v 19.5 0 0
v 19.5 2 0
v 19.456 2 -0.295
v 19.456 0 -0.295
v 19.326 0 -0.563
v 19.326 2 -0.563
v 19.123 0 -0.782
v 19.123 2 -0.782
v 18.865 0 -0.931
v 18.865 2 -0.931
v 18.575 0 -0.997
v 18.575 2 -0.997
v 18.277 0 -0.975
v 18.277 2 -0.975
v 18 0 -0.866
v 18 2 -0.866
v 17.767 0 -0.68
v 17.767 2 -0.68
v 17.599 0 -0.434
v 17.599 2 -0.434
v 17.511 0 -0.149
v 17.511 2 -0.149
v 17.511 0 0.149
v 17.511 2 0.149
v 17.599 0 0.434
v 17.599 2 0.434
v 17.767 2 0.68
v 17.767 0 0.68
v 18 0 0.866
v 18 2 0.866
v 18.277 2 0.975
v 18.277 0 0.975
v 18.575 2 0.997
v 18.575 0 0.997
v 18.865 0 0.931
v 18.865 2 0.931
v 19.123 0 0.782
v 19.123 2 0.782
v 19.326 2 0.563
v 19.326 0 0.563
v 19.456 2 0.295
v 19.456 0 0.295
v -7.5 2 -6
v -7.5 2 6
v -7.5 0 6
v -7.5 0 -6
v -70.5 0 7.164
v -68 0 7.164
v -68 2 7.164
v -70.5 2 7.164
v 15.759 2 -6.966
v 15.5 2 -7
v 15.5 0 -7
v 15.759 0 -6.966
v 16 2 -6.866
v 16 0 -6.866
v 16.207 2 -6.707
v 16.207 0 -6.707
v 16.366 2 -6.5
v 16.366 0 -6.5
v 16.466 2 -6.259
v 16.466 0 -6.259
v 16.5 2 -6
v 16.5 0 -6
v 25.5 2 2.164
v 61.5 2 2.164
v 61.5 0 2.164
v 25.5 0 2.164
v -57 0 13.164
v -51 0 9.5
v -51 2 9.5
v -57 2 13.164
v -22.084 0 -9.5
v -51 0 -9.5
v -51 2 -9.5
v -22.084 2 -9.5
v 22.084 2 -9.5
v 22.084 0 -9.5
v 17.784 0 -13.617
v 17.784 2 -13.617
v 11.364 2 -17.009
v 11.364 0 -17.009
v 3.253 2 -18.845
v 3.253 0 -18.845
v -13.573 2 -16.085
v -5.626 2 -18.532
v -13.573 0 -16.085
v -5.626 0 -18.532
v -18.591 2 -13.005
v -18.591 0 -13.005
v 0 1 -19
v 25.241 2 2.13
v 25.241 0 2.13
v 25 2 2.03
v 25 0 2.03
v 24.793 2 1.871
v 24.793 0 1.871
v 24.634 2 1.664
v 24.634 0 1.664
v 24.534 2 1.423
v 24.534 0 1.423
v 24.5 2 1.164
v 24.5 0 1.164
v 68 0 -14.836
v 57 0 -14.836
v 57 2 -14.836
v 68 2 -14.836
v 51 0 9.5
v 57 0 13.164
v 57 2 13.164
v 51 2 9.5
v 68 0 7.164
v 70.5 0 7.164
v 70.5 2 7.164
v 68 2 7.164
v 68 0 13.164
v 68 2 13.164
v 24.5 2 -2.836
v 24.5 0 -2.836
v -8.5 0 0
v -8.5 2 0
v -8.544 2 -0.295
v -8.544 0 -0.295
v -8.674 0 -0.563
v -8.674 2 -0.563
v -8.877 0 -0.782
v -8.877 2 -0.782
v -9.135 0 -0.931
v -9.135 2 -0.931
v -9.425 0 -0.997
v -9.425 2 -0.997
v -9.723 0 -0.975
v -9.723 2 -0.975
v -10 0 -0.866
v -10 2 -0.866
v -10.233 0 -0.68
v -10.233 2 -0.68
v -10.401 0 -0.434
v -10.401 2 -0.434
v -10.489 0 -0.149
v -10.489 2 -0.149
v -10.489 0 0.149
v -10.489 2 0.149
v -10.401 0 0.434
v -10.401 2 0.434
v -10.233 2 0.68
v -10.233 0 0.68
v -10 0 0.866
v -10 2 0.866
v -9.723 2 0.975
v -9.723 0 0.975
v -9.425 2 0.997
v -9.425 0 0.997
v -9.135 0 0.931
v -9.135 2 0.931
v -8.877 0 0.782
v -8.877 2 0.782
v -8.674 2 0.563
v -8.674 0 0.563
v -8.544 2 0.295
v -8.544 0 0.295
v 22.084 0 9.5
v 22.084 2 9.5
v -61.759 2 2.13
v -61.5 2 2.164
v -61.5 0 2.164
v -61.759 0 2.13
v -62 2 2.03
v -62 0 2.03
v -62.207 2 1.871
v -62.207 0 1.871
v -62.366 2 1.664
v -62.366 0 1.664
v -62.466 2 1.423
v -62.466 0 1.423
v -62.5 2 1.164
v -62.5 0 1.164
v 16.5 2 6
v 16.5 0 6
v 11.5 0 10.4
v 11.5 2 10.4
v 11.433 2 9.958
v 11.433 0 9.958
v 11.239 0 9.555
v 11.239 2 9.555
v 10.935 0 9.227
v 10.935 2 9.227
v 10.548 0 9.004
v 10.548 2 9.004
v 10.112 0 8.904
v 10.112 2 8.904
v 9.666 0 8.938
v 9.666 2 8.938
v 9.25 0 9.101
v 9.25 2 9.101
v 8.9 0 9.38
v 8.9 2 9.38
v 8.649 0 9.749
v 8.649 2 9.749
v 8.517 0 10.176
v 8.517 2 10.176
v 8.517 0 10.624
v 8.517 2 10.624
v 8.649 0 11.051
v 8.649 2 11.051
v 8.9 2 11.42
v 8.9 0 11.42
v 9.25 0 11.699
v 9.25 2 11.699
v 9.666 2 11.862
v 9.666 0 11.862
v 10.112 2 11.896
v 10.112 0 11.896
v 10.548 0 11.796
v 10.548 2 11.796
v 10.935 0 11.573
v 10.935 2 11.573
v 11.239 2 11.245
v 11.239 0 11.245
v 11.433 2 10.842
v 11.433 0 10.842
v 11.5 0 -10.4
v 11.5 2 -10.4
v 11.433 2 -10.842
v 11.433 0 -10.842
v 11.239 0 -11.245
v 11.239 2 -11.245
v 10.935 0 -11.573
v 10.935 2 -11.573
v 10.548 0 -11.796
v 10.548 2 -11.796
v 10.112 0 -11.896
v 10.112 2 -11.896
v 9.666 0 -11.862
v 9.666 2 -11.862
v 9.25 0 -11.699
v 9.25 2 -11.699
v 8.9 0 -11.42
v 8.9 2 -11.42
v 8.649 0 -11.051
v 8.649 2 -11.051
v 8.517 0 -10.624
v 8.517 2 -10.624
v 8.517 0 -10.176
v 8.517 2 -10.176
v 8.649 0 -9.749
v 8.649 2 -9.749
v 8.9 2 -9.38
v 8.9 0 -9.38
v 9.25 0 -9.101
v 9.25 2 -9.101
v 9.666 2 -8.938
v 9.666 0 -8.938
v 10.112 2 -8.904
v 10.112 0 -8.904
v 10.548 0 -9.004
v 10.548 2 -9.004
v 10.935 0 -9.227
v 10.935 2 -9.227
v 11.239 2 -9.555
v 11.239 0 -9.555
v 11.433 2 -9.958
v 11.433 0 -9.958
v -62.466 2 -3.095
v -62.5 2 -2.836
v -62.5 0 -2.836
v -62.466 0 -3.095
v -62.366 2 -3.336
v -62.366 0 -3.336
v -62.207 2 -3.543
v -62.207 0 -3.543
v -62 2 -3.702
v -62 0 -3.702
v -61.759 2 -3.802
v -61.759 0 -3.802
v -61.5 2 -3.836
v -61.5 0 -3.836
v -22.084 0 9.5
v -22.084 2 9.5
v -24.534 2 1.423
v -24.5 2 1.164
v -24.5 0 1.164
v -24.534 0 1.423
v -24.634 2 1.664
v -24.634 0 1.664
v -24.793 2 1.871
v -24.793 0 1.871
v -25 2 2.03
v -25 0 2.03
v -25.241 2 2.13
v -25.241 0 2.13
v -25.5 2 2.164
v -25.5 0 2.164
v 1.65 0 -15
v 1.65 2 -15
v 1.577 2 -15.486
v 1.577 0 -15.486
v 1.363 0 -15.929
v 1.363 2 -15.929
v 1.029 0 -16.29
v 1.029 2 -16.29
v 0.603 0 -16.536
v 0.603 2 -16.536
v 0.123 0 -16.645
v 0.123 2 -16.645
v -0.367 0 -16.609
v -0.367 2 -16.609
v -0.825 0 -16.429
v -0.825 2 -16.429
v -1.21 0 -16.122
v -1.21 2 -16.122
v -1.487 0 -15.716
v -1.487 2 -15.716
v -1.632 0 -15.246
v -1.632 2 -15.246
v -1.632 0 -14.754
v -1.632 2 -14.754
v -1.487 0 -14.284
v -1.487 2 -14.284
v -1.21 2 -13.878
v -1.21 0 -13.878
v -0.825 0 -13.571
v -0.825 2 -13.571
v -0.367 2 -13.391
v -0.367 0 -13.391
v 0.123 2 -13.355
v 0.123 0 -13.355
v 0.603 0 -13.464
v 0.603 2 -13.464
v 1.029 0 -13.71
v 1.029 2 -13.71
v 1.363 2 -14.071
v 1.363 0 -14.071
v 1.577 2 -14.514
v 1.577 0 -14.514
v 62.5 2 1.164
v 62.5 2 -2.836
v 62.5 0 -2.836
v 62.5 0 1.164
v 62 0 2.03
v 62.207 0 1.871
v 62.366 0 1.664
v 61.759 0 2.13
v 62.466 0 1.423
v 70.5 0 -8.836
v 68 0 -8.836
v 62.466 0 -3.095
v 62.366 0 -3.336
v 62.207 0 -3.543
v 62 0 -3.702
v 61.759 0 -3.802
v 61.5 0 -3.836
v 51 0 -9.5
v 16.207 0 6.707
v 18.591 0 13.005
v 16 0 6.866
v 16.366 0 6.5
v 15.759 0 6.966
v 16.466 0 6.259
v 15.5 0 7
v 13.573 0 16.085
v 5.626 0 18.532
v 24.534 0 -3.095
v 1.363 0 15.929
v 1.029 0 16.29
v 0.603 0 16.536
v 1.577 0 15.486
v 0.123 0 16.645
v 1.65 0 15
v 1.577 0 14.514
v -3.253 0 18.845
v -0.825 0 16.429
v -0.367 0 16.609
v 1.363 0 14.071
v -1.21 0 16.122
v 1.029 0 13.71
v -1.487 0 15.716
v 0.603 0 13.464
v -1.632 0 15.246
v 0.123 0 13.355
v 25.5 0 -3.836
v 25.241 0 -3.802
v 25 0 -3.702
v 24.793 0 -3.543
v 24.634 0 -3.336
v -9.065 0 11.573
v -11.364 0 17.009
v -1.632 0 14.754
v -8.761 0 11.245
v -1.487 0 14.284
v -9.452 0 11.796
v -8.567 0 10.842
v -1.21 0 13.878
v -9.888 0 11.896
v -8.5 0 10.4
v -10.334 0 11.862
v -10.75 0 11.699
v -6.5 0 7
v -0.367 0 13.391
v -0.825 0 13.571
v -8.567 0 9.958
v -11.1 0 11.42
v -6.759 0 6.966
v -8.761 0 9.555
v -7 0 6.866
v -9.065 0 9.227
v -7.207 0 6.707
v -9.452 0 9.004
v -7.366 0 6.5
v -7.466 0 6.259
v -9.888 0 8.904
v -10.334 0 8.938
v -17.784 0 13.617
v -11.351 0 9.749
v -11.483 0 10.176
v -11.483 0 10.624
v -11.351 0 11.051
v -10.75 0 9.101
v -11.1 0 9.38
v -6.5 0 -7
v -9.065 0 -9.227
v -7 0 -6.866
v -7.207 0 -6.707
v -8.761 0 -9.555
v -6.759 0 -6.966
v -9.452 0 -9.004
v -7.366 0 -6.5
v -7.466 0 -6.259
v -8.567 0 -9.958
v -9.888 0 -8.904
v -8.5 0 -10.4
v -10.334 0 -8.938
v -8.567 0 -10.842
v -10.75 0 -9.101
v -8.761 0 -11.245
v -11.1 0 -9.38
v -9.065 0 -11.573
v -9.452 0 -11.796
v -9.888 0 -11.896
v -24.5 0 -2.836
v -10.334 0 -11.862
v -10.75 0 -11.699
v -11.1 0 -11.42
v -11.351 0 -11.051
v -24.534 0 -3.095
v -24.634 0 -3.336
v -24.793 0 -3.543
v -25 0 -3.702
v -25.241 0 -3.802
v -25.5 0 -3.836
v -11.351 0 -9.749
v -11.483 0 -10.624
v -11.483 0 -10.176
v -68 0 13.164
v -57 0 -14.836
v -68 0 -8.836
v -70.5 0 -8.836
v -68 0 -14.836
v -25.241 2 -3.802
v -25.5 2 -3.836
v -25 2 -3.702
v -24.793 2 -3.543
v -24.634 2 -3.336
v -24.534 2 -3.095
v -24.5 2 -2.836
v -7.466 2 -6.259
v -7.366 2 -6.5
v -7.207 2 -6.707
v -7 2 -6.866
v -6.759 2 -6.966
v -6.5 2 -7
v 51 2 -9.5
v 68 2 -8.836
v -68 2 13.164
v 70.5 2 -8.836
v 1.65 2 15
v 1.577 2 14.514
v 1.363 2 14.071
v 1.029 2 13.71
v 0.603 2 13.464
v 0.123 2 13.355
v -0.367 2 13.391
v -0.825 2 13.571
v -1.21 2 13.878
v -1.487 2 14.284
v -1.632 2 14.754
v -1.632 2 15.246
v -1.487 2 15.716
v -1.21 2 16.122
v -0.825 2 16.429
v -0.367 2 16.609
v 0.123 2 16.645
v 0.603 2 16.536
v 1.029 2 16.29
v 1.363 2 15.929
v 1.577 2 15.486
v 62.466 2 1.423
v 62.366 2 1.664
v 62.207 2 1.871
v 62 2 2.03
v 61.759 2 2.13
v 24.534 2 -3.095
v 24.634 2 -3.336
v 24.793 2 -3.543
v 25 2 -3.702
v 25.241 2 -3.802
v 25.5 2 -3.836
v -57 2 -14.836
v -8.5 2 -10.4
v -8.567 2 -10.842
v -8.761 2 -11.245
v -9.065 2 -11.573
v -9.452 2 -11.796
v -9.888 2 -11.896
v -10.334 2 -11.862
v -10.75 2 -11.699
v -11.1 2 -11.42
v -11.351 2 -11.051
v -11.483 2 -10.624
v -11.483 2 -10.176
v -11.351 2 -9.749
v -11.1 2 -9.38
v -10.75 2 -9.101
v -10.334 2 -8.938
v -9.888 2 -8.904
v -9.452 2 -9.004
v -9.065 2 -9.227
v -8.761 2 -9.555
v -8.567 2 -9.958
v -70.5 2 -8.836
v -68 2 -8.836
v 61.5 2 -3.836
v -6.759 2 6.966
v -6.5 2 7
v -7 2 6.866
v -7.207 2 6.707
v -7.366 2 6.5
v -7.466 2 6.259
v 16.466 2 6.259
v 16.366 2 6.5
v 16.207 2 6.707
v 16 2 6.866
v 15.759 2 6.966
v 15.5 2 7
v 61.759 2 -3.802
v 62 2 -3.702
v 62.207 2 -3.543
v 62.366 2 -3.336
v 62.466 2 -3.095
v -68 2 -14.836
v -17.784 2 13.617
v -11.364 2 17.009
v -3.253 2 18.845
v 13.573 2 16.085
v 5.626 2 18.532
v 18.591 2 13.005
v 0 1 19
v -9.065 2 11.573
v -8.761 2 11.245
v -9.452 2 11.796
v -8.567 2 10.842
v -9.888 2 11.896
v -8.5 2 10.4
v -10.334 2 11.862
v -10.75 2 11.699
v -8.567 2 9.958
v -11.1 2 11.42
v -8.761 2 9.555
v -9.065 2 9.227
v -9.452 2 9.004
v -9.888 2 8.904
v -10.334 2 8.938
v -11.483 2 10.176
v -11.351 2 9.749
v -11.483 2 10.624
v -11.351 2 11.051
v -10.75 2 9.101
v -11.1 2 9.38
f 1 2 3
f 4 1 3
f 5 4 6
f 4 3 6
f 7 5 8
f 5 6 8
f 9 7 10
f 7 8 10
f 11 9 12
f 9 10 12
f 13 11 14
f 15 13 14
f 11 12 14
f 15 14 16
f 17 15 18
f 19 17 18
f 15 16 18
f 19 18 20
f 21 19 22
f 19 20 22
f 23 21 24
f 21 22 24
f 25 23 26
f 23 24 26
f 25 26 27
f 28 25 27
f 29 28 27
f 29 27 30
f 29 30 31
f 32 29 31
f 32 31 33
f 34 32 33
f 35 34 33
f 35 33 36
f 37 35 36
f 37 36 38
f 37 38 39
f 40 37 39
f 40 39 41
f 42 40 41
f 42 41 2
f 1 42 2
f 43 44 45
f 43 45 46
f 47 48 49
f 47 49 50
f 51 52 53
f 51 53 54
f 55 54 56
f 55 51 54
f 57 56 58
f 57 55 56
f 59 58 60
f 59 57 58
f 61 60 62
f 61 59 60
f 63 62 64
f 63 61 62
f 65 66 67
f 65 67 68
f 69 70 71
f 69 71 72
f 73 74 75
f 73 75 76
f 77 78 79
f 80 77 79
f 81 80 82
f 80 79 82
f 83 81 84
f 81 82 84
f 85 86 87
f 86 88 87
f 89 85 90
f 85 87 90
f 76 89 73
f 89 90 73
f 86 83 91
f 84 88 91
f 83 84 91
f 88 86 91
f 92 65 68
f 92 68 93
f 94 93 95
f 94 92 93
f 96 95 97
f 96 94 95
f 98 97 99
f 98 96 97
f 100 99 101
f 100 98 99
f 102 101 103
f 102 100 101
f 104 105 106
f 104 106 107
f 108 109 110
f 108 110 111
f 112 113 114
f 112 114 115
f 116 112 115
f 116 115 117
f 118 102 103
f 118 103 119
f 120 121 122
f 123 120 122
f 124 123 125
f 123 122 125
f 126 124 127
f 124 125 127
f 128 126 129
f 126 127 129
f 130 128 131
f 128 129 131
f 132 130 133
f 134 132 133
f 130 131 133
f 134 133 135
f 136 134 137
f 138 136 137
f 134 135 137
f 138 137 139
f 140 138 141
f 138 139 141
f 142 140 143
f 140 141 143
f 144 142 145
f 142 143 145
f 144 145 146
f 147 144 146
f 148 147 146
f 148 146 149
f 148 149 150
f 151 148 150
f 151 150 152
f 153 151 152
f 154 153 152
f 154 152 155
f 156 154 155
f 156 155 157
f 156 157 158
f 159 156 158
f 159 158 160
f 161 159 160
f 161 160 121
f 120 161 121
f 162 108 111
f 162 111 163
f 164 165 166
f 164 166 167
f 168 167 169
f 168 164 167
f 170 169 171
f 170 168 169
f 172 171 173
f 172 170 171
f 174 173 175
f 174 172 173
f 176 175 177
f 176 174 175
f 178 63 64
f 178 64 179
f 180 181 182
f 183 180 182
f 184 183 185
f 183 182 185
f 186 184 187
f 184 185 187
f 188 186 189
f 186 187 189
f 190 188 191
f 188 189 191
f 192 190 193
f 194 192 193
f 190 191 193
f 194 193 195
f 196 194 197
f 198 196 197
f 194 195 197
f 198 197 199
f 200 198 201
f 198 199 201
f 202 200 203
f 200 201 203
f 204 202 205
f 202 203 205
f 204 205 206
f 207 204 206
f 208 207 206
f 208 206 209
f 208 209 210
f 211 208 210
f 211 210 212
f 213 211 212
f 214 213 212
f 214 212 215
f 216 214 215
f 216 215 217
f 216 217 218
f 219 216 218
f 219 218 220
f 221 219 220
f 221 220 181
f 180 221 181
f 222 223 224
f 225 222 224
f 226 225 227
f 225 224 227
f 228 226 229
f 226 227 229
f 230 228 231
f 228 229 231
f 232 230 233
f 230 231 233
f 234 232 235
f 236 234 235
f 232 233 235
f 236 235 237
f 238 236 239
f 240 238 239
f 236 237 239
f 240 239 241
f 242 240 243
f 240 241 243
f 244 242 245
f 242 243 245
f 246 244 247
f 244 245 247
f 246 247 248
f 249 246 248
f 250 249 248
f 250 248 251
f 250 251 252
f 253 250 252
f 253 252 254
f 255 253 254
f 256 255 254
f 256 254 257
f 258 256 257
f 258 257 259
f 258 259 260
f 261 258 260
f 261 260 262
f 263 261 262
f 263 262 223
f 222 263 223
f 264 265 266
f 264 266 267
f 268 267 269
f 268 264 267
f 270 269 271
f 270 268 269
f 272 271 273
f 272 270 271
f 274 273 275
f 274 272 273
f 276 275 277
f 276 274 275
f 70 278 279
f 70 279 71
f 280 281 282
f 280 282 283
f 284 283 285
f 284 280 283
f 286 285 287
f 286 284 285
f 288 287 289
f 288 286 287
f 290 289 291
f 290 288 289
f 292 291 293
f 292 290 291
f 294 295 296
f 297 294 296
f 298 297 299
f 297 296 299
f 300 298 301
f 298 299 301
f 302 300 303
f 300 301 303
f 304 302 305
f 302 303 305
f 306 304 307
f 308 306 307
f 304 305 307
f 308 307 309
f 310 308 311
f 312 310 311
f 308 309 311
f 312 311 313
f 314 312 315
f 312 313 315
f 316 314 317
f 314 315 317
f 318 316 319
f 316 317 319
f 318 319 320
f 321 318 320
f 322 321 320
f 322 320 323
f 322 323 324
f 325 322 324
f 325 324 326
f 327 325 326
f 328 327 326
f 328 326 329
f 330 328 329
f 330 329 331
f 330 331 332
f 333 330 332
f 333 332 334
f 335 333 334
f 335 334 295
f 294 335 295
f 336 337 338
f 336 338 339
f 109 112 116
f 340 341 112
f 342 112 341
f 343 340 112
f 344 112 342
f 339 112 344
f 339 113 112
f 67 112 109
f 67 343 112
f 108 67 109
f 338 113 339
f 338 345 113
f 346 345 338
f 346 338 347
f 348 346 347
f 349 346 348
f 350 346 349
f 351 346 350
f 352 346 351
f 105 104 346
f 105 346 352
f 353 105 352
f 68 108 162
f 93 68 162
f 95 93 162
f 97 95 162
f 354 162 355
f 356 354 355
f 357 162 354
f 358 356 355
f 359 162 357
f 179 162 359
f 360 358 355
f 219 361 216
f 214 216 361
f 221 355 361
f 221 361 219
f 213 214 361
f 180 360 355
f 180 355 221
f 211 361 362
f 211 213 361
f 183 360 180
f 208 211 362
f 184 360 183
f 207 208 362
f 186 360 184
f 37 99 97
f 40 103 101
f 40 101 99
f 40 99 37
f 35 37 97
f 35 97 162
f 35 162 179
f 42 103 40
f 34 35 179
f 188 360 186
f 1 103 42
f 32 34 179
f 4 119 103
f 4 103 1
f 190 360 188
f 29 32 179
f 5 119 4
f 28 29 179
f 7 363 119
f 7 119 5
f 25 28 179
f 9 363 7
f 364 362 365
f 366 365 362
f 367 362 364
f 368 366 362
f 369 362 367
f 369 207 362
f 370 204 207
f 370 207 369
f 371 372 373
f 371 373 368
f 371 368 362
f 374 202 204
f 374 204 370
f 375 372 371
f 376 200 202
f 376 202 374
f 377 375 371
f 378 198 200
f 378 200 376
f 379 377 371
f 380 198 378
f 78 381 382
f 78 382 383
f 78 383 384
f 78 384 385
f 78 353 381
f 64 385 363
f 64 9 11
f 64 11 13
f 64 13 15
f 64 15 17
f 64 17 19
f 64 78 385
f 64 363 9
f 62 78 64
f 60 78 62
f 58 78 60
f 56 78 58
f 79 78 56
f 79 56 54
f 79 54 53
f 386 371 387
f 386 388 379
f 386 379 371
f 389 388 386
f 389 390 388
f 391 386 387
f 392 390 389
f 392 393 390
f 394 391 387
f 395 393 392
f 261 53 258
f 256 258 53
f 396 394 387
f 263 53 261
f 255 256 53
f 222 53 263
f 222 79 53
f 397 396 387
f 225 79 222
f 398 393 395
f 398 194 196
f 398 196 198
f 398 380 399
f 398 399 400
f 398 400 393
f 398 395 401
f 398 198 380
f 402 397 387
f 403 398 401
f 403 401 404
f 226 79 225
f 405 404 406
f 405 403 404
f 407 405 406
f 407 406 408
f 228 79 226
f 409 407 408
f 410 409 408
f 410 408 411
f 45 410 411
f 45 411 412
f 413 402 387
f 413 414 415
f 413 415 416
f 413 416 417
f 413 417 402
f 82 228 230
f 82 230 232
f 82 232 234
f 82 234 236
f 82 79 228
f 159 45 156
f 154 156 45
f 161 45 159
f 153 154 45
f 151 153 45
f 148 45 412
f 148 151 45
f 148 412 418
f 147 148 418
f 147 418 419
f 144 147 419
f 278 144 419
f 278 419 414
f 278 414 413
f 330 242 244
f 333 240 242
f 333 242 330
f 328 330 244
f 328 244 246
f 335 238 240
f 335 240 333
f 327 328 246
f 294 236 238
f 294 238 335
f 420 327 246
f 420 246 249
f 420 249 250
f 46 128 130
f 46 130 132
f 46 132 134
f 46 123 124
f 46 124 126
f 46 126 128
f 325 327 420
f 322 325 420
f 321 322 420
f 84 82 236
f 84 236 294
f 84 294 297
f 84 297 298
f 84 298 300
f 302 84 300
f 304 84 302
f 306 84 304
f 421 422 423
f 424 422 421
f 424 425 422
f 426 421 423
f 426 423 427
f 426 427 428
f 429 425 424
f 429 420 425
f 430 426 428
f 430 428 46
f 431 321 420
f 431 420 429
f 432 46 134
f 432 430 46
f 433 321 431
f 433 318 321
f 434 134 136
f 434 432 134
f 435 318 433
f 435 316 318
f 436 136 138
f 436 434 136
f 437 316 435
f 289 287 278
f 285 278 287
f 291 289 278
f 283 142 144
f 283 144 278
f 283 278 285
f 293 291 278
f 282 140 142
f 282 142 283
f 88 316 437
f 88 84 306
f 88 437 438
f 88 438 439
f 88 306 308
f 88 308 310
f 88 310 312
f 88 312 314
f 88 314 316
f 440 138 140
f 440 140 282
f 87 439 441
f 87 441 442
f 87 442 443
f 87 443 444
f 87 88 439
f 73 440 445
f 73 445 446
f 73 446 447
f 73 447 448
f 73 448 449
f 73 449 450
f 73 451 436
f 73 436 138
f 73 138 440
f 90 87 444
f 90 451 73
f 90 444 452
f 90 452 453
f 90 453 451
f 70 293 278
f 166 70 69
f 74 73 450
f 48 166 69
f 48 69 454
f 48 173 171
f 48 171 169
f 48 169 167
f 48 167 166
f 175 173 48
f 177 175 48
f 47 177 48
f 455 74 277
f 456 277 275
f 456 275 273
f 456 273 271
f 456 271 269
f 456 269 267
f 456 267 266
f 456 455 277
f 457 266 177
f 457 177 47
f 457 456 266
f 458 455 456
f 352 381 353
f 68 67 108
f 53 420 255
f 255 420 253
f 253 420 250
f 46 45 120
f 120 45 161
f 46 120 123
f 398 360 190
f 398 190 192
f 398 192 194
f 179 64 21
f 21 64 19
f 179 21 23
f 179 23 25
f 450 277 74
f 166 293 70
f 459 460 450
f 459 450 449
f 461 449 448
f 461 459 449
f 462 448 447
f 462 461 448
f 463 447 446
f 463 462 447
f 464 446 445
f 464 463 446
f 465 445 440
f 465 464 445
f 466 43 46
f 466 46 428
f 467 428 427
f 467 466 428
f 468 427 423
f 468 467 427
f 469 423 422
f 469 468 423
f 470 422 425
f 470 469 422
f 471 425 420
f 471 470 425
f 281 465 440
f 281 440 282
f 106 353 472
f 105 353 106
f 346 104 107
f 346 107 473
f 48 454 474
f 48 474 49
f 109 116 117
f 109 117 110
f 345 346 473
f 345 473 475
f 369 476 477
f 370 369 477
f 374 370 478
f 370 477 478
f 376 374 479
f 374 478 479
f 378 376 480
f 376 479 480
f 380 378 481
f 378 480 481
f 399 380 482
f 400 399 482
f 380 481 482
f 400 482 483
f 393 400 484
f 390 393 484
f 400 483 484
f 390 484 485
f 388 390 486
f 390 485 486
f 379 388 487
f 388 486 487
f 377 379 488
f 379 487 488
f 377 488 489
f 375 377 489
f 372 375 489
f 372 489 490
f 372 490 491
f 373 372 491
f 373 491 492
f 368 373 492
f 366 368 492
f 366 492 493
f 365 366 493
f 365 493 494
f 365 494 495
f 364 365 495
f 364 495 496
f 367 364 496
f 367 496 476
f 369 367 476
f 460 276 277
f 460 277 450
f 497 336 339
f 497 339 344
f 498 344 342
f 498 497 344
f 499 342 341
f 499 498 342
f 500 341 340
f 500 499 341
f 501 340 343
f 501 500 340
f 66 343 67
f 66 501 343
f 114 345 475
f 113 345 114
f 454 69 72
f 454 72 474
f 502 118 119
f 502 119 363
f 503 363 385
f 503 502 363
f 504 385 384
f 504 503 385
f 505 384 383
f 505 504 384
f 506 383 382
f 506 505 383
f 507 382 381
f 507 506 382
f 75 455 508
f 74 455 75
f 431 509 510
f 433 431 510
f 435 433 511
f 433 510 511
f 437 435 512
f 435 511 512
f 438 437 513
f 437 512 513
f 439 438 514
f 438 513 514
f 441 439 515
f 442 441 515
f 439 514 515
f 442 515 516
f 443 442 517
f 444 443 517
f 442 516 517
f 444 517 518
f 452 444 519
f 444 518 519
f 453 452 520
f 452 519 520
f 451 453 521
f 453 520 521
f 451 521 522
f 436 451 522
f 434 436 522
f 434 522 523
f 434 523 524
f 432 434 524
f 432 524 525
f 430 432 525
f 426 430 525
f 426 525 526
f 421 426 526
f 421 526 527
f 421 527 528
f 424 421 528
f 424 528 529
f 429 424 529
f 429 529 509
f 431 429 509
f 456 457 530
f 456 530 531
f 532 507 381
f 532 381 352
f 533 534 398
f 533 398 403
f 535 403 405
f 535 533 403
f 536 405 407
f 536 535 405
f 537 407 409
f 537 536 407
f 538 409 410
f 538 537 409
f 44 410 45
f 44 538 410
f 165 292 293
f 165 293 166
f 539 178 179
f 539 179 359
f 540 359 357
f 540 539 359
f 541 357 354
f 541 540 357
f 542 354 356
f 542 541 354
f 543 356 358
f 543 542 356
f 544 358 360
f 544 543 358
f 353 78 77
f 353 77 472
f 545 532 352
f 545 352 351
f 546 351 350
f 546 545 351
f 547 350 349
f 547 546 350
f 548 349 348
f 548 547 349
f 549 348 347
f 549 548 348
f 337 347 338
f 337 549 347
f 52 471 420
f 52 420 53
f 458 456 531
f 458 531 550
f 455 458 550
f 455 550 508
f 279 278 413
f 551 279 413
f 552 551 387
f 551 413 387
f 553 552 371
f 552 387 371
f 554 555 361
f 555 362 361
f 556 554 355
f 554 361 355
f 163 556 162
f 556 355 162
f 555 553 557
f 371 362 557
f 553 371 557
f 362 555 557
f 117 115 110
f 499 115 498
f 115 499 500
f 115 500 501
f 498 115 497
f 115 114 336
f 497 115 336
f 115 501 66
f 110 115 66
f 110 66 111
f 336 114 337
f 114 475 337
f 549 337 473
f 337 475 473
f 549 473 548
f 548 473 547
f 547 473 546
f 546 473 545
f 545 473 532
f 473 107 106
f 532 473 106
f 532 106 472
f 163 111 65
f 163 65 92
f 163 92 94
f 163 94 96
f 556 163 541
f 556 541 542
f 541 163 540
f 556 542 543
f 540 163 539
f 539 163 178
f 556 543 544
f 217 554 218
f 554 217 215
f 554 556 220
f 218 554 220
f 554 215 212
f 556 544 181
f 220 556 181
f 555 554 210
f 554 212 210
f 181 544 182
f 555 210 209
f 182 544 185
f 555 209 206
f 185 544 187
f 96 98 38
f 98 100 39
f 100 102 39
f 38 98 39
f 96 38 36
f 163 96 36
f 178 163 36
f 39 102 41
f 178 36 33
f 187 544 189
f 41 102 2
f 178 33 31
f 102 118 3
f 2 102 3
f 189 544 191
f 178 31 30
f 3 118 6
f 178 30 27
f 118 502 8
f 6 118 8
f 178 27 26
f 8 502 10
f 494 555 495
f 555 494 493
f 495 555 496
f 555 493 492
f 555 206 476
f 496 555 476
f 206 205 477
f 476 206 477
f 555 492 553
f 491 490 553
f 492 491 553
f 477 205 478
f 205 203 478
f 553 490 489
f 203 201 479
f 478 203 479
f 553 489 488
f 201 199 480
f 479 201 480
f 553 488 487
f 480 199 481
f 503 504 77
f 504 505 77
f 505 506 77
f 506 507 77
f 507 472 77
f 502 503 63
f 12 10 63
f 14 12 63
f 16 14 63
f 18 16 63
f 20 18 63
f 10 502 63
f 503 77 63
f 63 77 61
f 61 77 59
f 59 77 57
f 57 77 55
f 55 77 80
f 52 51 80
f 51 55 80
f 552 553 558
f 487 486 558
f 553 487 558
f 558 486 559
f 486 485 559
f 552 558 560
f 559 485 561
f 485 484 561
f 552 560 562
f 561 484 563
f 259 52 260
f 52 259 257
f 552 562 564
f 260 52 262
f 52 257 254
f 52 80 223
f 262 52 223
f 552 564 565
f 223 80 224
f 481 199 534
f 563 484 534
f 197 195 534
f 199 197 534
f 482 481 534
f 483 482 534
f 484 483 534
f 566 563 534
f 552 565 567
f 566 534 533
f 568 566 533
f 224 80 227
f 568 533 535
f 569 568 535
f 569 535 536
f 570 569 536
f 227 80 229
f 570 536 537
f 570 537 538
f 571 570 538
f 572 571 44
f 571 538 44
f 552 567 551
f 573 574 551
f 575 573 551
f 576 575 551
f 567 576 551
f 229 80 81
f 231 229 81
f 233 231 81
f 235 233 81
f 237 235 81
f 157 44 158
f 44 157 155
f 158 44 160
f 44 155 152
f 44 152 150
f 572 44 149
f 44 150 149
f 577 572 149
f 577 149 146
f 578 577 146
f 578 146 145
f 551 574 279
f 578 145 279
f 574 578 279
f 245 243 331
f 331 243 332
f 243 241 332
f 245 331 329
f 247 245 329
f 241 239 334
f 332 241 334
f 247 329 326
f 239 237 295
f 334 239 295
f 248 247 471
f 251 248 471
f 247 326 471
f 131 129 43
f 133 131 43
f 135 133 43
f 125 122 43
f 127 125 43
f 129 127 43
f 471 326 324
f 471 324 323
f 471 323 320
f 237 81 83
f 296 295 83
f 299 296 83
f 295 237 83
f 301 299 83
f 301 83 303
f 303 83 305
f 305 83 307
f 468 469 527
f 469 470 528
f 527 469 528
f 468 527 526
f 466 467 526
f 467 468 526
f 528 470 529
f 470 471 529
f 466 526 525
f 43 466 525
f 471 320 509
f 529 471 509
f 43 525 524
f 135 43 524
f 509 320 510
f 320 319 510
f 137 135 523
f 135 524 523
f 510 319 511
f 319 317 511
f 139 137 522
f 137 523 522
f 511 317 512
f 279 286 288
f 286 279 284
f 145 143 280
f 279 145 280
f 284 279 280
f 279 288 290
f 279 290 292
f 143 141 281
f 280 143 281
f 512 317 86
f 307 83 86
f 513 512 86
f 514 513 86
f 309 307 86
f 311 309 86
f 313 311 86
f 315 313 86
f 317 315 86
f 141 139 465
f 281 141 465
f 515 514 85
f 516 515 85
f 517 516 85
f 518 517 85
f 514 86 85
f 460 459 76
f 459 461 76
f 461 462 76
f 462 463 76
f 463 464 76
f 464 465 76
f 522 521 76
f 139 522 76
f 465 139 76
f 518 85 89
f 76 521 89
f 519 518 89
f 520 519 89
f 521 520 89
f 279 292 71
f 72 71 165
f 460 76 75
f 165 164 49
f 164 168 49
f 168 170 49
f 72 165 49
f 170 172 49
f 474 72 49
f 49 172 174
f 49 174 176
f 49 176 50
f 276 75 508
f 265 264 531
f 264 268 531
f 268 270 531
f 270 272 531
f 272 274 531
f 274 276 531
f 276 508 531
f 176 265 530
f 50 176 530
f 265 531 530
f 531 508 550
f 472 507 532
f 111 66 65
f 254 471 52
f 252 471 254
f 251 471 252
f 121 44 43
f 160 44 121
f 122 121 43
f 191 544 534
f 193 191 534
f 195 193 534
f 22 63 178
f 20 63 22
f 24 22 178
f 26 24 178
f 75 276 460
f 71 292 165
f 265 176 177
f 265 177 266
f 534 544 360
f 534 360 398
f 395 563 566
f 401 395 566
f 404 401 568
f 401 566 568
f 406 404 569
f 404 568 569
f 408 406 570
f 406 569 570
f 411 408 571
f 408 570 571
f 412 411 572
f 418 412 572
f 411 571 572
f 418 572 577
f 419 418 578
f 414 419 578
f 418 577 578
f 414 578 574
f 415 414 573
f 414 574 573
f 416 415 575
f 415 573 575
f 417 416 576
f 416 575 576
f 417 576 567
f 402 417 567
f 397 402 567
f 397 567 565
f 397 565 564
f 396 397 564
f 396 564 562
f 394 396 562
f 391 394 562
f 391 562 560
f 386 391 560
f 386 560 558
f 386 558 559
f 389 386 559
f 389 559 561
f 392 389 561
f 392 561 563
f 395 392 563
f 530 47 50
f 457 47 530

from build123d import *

# Parameters (mm, degrees)
RESSALTO_EXTRUS_O1_DEPTH = 2
ESBO_O2_R                = 1.65
ESBO_O2_R_2              = 1.5
ESBO_O2_R_3              = 1
CORTE_EXTRUS_O1_DEPTH    = 3.0000001


with BuildPart() as part:
    # Esboço1 → Ressalto-extrusão1 (new body)
    with BuildSketch(Plane(origin=(0, 0, 0), x_dir=(1, 0, 0), z_dir=(0, 1, 0))):
        with BuildLine():
            Line((-57, 14.836150135), (-51, 9.5))
            Line((-51, 9.5), (-22.083647797, 9.5))
            add(Edge.make_bspline(
                [(22.083647797, 9.5), (0, 38), (-22.083647797, 9.5)],
                knots=[0.523598776, 0.523598776, 0.523598776, 2.617993878, 2.617993878, 2.617993878], degree=2, weights=[1, 0.5, 1]))
            Line((22.083647797, 9.5), (51, 9.5))
            Line((51, 9.5), (57, 14.836150135))
            Line((57, 14.836150135), (68, 14.836150135))
            Line((68, 14.836150135), (68, 8.836150135))
            Line((68, 8.836150135), (70.5, 8.836150135))
            Line((70.5, 8.836150135), (70.5, -7.163849865))
            Line((70.5, -7.163849865), (68, -7.163849865))
            Line((68, -7.163849865), (68, -13.163849865))
            Line((68, -13.163849865), (57, -13.163849865))
            Line((57, -13.163849865), (51, -9.5))
            Line((51, -9.5), (22.083647797, -9.5))
            add(Edge.make_bspline(
                [(-22.083647797, -9.5), (0, -38), (22.083647797, -9.5)],
                knots=[3.665191429, 3.665191429, 3.665191429, 5.759586532, 5.759586532, 5.759586532], degree=2, weights=[1, 0.5, 1]))
            Line((-22.083647797, -9.5), (-51, -9.5))
            Line((-51, -9.5), (-57, -13.163849865))
            Line((-57, -13.163849865), (-68, -13.163849865))
            Line((-68, -13.163849865), (-68, -7.163849865))
            Line((-68, -7.163849865), (-70.5, -7.163849865))
            Line((-70.5, -7.163849865), (-70.5, 8.836150135))
            Line((-70.5, 8.836150135), (-68, 8.836150135))
            Line((-68, 8.836150135), (-68, 14.836150135))
            Line((-68, 14.836150135), (-57, 14.836150135))
        make_face()
    extrude(amount=RESSALTO_EXTRUS_O1_DEPTH)

    # Esboço2 → Corte-extrusão1 (cut, through all)
    with BuildSketch(Plane(origin=(0, 2, 0), x_dir=(1, 0, 0), z_dir=(0, 1, 0))):
        with Locations((0, 15)):
            Circle(ESBO_O2_R)
        with Locations((10, 10.4)):
            Circle(ESBO_O2_R_2)
        with Locations((-10, 10.4)):
            Circle(ESBO_O2_R_2)
        with Locations((0, -15)):
            Circle(ESBO_O2_R)
        with Locations((10, -10.4)):
            Circle(ESBO_O2_R_2)
        with Locations((-10, -10.4)):
            Circle(ESBO_O2_R_2)
        with Locations((-9.5, 0)):
            Circle(ESBO_O2_R_3)
        with Locations((18.5, 0)):
            Circle(ESBO_O2_R_3)
        with BuildLine():
            Line((25.5, 3.836150135), (61.5, 3.836150135))
            ThreePointArc((61.5, 3.836150135), (62.207106781, 3.543256916), (62.5, 2.836150135))
            Line((62.5, 2.836150135), (62.5, -1.163849865))
            ThreePointArc((62.5, -1.163849865), (62.207106781, -1.870956646), (61.5, -2.163849865))
            Line((61.5, -2.163849865), (25.5, -2.163849865))
            ThreePointArc((25.5, -2.163849865), (24.792893219, -1.870956646), (24.5, -1.163849865))
            Line((24.5, -1.163849865), (24.5, 2.836150135))
            ThreePointArc((24.5, 2.836150135), (24.792893219, 3.543256916), (25.5, 3.836150135))
        make_face()
        with BuildLine():
            Line((-61.5, 3.836150135), (-25.5, 3.836150135))
            ThreePointArc((-25.5, 3.836150135), (-24.792893219, 3.543256916), (-24.5, 2.836150135))
            Line((-24.5, 2.836150135), (-24.5, -1.163849865))
            ThreePointArc((-24.5, -1.163849865), (-24.792893219, -1.870956646), (-25.5, -2.163849865))
            Line((-25.5, -2.163849865), (-61.5, -2.163849865))
            ThreePointArc((-61.5, -2.163849865), (-62.207106781, -1.870956646), (-62.5, -1.163849865))
            Line((-62.5, -1.163849865), (-62.5, 2.836150135))
            ThreePointArc((-62.5, 2.836150135), (-62.207106781, 3.543256916), (-61.5, 3.836150135))
        make_face()
        with BuildLine():
            Line((-6.5, 7), (15.5, 7))
            ThreePointArc((15.5, 7), (16.207106781, 6.707106781), (16.5, 6))
            Line((16.5, 6), (16.5, -6))
            ThreePointArc((16.5, -6), (16.207106781, -6.707106781), (15.5, -7))
            Line((15.5, -7), (-6.5, -7))
            ThreePointArc((-6.5, -7), (-7.207106781, -6.707106781), (-7.5, -6))
            Line((-7.5, -6), (-7.5, 6))
            ThreePointArc((-7.5, 6), (-7.207106781, 6.707106781), (-6.5, 7))
        make_face()
    extrude(amount=-CORTE_EXTRUS_O1_DEPTH, mode=Mode.SUBTRACT)


solid = part.part
